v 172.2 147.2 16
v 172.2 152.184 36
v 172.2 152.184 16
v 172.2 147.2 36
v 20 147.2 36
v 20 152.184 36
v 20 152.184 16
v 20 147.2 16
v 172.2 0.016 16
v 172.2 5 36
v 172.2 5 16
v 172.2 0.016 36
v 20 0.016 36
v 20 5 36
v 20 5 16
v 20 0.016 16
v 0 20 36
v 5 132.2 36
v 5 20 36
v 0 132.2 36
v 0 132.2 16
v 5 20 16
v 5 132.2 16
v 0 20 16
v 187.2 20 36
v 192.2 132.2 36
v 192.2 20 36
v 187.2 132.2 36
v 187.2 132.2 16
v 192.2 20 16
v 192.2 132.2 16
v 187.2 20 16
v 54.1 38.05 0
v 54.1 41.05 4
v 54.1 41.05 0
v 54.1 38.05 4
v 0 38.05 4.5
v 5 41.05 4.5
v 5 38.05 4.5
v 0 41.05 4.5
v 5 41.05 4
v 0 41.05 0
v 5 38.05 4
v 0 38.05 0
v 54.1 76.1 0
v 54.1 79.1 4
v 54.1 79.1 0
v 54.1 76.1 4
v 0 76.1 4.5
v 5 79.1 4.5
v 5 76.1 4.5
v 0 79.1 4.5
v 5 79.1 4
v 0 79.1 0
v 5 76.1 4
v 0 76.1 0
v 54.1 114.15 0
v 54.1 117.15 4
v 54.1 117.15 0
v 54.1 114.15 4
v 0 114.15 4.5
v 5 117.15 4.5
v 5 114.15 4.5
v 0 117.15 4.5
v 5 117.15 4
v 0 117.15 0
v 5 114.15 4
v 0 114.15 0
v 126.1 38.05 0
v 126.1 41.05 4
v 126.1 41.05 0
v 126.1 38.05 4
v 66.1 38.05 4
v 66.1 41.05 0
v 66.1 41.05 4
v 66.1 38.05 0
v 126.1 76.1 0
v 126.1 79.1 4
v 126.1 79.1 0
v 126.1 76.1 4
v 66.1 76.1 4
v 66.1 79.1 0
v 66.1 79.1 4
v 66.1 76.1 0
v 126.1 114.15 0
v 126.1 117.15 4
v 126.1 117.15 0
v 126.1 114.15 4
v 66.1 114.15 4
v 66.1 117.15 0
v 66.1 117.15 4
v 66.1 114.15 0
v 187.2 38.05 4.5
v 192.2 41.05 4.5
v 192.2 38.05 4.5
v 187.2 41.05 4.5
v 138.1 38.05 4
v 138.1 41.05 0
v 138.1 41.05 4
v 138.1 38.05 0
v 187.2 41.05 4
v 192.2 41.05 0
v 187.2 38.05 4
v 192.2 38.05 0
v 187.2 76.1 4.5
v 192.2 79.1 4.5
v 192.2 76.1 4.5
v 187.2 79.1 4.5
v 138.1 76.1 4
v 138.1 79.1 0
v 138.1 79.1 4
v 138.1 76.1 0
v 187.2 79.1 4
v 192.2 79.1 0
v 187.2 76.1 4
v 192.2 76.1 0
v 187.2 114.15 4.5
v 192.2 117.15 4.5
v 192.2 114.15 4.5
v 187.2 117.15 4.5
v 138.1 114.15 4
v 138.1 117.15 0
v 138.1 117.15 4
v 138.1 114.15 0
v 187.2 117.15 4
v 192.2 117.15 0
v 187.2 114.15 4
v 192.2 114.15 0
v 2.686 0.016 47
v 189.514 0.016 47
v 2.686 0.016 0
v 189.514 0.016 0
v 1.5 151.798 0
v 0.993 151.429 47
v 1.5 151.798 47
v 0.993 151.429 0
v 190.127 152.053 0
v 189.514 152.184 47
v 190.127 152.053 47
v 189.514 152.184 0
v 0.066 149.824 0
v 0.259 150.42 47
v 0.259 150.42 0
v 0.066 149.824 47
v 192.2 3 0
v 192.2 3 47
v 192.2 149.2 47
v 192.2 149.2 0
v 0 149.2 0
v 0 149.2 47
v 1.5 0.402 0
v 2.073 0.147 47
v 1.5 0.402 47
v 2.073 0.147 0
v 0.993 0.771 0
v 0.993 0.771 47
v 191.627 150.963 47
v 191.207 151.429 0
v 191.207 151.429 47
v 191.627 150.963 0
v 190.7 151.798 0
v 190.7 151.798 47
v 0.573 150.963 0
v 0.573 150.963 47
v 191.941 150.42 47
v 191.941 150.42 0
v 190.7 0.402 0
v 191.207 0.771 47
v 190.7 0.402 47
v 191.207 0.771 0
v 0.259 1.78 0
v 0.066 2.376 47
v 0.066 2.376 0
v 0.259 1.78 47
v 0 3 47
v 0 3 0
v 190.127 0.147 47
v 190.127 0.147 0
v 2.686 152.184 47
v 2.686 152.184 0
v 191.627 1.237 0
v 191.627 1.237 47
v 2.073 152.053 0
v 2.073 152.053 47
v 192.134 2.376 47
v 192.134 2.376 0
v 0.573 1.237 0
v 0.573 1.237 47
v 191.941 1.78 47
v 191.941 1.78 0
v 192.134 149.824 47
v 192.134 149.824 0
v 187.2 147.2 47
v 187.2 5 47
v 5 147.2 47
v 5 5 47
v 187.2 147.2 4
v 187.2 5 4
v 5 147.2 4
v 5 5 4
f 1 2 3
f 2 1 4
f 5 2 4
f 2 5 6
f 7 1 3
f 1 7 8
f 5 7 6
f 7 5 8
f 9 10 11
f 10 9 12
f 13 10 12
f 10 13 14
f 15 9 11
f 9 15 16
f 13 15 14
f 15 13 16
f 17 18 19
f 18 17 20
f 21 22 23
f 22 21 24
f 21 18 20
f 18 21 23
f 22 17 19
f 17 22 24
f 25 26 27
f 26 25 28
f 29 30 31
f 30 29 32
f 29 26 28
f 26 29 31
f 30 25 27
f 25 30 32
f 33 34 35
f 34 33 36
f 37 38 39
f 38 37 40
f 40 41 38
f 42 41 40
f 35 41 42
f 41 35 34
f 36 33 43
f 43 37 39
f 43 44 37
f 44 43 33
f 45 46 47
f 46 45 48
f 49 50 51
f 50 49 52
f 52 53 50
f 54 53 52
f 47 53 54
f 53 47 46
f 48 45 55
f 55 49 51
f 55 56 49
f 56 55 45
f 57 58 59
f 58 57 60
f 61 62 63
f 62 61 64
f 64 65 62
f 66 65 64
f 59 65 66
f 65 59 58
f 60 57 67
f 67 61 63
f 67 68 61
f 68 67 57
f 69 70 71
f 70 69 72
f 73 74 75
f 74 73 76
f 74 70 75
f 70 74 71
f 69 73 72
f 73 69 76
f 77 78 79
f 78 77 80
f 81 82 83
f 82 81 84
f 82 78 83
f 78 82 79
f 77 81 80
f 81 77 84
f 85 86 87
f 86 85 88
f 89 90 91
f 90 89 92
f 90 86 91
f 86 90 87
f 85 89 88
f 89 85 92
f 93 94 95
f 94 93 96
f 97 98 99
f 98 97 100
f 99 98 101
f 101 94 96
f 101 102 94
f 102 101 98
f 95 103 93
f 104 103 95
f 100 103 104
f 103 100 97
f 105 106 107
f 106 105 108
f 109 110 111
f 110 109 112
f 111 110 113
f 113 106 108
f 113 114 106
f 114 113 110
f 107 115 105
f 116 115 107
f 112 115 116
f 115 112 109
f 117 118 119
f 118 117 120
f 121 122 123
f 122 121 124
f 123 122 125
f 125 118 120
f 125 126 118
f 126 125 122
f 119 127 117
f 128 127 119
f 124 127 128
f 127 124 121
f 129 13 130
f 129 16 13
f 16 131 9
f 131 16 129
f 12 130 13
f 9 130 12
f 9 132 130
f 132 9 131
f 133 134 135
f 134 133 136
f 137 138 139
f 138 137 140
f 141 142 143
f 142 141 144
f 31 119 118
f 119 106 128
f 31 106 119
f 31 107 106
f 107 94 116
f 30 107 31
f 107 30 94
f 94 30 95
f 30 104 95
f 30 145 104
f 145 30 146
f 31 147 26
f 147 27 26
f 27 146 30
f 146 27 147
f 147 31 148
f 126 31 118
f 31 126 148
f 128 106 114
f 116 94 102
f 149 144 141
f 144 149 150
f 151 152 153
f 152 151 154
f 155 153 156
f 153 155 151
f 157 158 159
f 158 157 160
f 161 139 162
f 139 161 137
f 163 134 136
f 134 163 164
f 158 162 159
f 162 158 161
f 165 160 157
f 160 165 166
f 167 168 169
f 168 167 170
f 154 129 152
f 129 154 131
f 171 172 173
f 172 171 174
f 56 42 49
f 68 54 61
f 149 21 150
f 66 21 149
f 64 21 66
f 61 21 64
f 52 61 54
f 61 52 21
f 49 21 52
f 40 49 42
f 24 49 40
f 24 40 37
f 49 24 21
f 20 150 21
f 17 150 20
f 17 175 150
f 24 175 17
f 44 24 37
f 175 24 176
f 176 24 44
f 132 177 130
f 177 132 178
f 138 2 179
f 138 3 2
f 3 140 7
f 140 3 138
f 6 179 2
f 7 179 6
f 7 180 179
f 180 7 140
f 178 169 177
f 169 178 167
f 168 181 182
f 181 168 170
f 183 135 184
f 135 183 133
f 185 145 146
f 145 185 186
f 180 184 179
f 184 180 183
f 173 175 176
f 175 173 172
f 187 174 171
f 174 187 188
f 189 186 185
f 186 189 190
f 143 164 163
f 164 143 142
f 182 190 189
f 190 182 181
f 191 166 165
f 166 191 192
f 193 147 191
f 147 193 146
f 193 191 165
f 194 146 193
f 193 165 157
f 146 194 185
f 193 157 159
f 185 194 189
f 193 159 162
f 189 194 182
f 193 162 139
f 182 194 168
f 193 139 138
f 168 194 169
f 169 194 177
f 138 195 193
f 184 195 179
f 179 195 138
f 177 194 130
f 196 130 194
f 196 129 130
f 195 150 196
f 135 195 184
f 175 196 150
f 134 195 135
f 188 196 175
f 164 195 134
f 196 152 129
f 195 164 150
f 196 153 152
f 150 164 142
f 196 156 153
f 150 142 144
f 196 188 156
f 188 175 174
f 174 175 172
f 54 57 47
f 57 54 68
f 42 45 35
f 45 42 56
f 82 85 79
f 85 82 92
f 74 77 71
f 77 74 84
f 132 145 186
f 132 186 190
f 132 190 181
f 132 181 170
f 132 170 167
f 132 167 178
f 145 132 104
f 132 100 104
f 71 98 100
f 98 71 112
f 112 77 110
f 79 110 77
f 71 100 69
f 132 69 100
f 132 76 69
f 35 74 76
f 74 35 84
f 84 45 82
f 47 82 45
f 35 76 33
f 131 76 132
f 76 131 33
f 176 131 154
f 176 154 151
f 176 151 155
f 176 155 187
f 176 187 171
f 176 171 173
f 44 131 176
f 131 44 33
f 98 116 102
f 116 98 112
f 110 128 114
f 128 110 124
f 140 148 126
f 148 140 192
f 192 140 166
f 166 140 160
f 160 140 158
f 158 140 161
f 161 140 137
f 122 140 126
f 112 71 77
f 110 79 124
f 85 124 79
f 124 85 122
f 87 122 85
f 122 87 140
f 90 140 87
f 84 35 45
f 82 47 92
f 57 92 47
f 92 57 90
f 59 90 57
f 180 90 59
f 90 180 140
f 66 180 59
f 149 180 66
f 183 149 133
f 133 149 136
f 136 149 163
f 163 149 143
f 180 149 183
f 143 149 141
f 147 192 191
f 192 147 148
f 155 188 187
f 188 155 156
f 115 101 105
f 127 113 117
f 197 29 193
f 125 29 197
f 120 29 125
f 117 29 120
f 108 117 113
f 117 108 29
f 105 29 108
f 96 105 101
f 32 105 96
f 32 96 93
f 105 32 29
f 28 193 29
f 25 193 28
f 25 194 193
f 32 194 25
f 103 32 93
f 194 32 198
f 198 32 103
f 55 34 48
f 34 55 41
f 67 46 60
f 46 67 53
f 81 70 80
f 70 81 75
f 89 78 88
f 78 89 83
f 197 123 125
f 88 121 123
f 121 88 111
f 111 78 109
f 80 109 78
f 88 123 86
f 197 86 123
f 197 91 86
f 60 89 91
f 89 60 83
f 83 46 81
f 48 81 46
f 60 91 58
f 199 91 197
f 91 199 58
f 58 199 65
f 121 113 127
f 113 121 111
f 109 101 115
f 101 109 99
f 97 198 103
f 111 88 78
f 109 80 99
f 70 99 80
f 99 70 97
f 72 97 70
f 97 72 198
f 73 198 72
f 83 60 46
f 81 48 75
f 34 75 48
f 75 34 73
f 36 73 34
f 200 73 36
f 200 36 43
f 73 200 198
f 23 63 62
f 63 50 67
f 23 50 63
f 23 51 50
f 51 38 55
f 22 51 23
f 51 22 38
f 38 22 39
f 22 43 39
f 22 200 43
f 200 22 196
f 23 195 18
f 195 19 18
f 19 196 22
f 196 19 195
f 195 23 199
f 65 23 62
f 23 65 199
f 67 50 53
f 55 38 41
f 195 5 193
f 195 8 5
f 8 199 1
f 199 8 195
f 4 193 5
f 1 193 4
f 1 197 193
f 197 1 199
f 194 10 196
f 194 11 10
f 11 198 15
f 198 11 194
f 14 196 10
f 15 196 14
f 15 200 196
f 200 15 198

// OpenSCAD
// RK3568 Protective Base - Window Frame Style
// Board: 正点原子 ATK-DLRK3568, 180.2x140.2mm

// ======================== Parameters ========================

board_x = 180.2;
board_y = 140.2;

wall      = 5;       // wall thickness
base      = 4;       // bottom plate thickness
wall_h    = 43;      // total wall height (4mm base + 43mm wall = 47mm total)
base_h    = 12;      // solid base wall height
corner    = 15;      // corner pillar width
top_strip = 11;      // top connecting strip thickness (45 - 2 - 10 - 22 = 11mm)
clearance = 1;       // board-to-wall gap
corner_r  = 3;       // corner fillet radius

// Derived
inner_x = board_x + clearance * 2;
inner_y = board_y + clearance * 2;
outer_x = inner_x + wall * 2;
outer_y = inner_y + wall * 2;

// ======================== Modules ========================

module rounded_box(sx, sy, sz, r) {
    hull() {
        translate([r, r, 0])
            cylinder(h = sz, r = r, $fn = 30);
        translate([sx - r, r, 0])
            cylinder(h = sz, r = r, $fn = 30);
        translate([r, sy - r, 0])
            cylinder(h = sz, r = r, $fn = 30);
        translate([sx - r, sy - r, 0])
            cylinder(h = sz, r = r, $fn = 30);
    }
}

// ======================== Window Cutouts ========================
// Cut from the middle of each wall, leaving:
//   - solid bottom (base_h)
//   - solid top strip (top_strip)
//   - solid corner pillars (corner)

module window_cuts() {
    win_z_bot = base + base_h;          // window starts above base wall
    win_z_top = base + wall_h - top_strip; // window ends below top strip
    win_h = win_z_top - win_z_bot;

    // Top long side A
    translate([wall + corner, outer_y - wall - 0.5, win_z_bot])
        cube([inner_x - corner * 2, wall + 1, win_h]);

    // Bottom long side C
    translate([wall + corner, -0.5, win_z_bot])
        cube([inner_x - corner * 2, wall + 1, win_h]);

    // Left short side B
    translate([-0.5, wall + corner, win_z_bot])
        cube([wall + 1, inner_y - corner * 2, win_h]);

    // Right short side D
    translate([outer_x - wall - 0.5, wall + corner, win_z_bot])
        cube([wall + 1, inner_y - corner * 2, win_h]);
}

// ======================== Ventilation Holes ========================

module vent_holes() {
    slot_w = 60;
    slot_h = 3;
    n_slots = 3;
    gap = 12;
    start_x = (outer_x - n_slots * slot_w - (n_slots - 1) * gap) / 2;

    for (i = [0 : n_slots - 1]) {
        translate([start_x + i * (slot_w + gap), outer_y * 0.25, -0.5])
            cube([slot_w, slot_h, base + 1]);
        translate([start_x + i * (slot_w + gap), outer_y * 0.5, -0.5])
            cube([slot_w, slot_h, base + 1]);
        translate([start_x + i * (slot_w + gap), outer_y * 0.75, -0.5])
            cube([slot_w, slot_h, base + 1]);
    }
}

// ======================== Assembly ========================

difference() {
    rounded_box(outer_x, outer_y, base + wall_h, corner_r);
    // Inner cavity
    translate([wall, wall, base])
        cube([inner_x, inner_y, wall_h + 1]);
    // Window cutouts
    window_cuts();
    // Ventilation holes in bottom
    vent_holes();
}

// ======================== Dimensions ========================
// Outer: 192 x 152 x 75 mm
// Inner: 182 x 142 mm
// Base solid wall: 40mm high
// Window opening: ~150x110mm per side, 22mm tall
// Top strip: 11mm connecting all four walls
